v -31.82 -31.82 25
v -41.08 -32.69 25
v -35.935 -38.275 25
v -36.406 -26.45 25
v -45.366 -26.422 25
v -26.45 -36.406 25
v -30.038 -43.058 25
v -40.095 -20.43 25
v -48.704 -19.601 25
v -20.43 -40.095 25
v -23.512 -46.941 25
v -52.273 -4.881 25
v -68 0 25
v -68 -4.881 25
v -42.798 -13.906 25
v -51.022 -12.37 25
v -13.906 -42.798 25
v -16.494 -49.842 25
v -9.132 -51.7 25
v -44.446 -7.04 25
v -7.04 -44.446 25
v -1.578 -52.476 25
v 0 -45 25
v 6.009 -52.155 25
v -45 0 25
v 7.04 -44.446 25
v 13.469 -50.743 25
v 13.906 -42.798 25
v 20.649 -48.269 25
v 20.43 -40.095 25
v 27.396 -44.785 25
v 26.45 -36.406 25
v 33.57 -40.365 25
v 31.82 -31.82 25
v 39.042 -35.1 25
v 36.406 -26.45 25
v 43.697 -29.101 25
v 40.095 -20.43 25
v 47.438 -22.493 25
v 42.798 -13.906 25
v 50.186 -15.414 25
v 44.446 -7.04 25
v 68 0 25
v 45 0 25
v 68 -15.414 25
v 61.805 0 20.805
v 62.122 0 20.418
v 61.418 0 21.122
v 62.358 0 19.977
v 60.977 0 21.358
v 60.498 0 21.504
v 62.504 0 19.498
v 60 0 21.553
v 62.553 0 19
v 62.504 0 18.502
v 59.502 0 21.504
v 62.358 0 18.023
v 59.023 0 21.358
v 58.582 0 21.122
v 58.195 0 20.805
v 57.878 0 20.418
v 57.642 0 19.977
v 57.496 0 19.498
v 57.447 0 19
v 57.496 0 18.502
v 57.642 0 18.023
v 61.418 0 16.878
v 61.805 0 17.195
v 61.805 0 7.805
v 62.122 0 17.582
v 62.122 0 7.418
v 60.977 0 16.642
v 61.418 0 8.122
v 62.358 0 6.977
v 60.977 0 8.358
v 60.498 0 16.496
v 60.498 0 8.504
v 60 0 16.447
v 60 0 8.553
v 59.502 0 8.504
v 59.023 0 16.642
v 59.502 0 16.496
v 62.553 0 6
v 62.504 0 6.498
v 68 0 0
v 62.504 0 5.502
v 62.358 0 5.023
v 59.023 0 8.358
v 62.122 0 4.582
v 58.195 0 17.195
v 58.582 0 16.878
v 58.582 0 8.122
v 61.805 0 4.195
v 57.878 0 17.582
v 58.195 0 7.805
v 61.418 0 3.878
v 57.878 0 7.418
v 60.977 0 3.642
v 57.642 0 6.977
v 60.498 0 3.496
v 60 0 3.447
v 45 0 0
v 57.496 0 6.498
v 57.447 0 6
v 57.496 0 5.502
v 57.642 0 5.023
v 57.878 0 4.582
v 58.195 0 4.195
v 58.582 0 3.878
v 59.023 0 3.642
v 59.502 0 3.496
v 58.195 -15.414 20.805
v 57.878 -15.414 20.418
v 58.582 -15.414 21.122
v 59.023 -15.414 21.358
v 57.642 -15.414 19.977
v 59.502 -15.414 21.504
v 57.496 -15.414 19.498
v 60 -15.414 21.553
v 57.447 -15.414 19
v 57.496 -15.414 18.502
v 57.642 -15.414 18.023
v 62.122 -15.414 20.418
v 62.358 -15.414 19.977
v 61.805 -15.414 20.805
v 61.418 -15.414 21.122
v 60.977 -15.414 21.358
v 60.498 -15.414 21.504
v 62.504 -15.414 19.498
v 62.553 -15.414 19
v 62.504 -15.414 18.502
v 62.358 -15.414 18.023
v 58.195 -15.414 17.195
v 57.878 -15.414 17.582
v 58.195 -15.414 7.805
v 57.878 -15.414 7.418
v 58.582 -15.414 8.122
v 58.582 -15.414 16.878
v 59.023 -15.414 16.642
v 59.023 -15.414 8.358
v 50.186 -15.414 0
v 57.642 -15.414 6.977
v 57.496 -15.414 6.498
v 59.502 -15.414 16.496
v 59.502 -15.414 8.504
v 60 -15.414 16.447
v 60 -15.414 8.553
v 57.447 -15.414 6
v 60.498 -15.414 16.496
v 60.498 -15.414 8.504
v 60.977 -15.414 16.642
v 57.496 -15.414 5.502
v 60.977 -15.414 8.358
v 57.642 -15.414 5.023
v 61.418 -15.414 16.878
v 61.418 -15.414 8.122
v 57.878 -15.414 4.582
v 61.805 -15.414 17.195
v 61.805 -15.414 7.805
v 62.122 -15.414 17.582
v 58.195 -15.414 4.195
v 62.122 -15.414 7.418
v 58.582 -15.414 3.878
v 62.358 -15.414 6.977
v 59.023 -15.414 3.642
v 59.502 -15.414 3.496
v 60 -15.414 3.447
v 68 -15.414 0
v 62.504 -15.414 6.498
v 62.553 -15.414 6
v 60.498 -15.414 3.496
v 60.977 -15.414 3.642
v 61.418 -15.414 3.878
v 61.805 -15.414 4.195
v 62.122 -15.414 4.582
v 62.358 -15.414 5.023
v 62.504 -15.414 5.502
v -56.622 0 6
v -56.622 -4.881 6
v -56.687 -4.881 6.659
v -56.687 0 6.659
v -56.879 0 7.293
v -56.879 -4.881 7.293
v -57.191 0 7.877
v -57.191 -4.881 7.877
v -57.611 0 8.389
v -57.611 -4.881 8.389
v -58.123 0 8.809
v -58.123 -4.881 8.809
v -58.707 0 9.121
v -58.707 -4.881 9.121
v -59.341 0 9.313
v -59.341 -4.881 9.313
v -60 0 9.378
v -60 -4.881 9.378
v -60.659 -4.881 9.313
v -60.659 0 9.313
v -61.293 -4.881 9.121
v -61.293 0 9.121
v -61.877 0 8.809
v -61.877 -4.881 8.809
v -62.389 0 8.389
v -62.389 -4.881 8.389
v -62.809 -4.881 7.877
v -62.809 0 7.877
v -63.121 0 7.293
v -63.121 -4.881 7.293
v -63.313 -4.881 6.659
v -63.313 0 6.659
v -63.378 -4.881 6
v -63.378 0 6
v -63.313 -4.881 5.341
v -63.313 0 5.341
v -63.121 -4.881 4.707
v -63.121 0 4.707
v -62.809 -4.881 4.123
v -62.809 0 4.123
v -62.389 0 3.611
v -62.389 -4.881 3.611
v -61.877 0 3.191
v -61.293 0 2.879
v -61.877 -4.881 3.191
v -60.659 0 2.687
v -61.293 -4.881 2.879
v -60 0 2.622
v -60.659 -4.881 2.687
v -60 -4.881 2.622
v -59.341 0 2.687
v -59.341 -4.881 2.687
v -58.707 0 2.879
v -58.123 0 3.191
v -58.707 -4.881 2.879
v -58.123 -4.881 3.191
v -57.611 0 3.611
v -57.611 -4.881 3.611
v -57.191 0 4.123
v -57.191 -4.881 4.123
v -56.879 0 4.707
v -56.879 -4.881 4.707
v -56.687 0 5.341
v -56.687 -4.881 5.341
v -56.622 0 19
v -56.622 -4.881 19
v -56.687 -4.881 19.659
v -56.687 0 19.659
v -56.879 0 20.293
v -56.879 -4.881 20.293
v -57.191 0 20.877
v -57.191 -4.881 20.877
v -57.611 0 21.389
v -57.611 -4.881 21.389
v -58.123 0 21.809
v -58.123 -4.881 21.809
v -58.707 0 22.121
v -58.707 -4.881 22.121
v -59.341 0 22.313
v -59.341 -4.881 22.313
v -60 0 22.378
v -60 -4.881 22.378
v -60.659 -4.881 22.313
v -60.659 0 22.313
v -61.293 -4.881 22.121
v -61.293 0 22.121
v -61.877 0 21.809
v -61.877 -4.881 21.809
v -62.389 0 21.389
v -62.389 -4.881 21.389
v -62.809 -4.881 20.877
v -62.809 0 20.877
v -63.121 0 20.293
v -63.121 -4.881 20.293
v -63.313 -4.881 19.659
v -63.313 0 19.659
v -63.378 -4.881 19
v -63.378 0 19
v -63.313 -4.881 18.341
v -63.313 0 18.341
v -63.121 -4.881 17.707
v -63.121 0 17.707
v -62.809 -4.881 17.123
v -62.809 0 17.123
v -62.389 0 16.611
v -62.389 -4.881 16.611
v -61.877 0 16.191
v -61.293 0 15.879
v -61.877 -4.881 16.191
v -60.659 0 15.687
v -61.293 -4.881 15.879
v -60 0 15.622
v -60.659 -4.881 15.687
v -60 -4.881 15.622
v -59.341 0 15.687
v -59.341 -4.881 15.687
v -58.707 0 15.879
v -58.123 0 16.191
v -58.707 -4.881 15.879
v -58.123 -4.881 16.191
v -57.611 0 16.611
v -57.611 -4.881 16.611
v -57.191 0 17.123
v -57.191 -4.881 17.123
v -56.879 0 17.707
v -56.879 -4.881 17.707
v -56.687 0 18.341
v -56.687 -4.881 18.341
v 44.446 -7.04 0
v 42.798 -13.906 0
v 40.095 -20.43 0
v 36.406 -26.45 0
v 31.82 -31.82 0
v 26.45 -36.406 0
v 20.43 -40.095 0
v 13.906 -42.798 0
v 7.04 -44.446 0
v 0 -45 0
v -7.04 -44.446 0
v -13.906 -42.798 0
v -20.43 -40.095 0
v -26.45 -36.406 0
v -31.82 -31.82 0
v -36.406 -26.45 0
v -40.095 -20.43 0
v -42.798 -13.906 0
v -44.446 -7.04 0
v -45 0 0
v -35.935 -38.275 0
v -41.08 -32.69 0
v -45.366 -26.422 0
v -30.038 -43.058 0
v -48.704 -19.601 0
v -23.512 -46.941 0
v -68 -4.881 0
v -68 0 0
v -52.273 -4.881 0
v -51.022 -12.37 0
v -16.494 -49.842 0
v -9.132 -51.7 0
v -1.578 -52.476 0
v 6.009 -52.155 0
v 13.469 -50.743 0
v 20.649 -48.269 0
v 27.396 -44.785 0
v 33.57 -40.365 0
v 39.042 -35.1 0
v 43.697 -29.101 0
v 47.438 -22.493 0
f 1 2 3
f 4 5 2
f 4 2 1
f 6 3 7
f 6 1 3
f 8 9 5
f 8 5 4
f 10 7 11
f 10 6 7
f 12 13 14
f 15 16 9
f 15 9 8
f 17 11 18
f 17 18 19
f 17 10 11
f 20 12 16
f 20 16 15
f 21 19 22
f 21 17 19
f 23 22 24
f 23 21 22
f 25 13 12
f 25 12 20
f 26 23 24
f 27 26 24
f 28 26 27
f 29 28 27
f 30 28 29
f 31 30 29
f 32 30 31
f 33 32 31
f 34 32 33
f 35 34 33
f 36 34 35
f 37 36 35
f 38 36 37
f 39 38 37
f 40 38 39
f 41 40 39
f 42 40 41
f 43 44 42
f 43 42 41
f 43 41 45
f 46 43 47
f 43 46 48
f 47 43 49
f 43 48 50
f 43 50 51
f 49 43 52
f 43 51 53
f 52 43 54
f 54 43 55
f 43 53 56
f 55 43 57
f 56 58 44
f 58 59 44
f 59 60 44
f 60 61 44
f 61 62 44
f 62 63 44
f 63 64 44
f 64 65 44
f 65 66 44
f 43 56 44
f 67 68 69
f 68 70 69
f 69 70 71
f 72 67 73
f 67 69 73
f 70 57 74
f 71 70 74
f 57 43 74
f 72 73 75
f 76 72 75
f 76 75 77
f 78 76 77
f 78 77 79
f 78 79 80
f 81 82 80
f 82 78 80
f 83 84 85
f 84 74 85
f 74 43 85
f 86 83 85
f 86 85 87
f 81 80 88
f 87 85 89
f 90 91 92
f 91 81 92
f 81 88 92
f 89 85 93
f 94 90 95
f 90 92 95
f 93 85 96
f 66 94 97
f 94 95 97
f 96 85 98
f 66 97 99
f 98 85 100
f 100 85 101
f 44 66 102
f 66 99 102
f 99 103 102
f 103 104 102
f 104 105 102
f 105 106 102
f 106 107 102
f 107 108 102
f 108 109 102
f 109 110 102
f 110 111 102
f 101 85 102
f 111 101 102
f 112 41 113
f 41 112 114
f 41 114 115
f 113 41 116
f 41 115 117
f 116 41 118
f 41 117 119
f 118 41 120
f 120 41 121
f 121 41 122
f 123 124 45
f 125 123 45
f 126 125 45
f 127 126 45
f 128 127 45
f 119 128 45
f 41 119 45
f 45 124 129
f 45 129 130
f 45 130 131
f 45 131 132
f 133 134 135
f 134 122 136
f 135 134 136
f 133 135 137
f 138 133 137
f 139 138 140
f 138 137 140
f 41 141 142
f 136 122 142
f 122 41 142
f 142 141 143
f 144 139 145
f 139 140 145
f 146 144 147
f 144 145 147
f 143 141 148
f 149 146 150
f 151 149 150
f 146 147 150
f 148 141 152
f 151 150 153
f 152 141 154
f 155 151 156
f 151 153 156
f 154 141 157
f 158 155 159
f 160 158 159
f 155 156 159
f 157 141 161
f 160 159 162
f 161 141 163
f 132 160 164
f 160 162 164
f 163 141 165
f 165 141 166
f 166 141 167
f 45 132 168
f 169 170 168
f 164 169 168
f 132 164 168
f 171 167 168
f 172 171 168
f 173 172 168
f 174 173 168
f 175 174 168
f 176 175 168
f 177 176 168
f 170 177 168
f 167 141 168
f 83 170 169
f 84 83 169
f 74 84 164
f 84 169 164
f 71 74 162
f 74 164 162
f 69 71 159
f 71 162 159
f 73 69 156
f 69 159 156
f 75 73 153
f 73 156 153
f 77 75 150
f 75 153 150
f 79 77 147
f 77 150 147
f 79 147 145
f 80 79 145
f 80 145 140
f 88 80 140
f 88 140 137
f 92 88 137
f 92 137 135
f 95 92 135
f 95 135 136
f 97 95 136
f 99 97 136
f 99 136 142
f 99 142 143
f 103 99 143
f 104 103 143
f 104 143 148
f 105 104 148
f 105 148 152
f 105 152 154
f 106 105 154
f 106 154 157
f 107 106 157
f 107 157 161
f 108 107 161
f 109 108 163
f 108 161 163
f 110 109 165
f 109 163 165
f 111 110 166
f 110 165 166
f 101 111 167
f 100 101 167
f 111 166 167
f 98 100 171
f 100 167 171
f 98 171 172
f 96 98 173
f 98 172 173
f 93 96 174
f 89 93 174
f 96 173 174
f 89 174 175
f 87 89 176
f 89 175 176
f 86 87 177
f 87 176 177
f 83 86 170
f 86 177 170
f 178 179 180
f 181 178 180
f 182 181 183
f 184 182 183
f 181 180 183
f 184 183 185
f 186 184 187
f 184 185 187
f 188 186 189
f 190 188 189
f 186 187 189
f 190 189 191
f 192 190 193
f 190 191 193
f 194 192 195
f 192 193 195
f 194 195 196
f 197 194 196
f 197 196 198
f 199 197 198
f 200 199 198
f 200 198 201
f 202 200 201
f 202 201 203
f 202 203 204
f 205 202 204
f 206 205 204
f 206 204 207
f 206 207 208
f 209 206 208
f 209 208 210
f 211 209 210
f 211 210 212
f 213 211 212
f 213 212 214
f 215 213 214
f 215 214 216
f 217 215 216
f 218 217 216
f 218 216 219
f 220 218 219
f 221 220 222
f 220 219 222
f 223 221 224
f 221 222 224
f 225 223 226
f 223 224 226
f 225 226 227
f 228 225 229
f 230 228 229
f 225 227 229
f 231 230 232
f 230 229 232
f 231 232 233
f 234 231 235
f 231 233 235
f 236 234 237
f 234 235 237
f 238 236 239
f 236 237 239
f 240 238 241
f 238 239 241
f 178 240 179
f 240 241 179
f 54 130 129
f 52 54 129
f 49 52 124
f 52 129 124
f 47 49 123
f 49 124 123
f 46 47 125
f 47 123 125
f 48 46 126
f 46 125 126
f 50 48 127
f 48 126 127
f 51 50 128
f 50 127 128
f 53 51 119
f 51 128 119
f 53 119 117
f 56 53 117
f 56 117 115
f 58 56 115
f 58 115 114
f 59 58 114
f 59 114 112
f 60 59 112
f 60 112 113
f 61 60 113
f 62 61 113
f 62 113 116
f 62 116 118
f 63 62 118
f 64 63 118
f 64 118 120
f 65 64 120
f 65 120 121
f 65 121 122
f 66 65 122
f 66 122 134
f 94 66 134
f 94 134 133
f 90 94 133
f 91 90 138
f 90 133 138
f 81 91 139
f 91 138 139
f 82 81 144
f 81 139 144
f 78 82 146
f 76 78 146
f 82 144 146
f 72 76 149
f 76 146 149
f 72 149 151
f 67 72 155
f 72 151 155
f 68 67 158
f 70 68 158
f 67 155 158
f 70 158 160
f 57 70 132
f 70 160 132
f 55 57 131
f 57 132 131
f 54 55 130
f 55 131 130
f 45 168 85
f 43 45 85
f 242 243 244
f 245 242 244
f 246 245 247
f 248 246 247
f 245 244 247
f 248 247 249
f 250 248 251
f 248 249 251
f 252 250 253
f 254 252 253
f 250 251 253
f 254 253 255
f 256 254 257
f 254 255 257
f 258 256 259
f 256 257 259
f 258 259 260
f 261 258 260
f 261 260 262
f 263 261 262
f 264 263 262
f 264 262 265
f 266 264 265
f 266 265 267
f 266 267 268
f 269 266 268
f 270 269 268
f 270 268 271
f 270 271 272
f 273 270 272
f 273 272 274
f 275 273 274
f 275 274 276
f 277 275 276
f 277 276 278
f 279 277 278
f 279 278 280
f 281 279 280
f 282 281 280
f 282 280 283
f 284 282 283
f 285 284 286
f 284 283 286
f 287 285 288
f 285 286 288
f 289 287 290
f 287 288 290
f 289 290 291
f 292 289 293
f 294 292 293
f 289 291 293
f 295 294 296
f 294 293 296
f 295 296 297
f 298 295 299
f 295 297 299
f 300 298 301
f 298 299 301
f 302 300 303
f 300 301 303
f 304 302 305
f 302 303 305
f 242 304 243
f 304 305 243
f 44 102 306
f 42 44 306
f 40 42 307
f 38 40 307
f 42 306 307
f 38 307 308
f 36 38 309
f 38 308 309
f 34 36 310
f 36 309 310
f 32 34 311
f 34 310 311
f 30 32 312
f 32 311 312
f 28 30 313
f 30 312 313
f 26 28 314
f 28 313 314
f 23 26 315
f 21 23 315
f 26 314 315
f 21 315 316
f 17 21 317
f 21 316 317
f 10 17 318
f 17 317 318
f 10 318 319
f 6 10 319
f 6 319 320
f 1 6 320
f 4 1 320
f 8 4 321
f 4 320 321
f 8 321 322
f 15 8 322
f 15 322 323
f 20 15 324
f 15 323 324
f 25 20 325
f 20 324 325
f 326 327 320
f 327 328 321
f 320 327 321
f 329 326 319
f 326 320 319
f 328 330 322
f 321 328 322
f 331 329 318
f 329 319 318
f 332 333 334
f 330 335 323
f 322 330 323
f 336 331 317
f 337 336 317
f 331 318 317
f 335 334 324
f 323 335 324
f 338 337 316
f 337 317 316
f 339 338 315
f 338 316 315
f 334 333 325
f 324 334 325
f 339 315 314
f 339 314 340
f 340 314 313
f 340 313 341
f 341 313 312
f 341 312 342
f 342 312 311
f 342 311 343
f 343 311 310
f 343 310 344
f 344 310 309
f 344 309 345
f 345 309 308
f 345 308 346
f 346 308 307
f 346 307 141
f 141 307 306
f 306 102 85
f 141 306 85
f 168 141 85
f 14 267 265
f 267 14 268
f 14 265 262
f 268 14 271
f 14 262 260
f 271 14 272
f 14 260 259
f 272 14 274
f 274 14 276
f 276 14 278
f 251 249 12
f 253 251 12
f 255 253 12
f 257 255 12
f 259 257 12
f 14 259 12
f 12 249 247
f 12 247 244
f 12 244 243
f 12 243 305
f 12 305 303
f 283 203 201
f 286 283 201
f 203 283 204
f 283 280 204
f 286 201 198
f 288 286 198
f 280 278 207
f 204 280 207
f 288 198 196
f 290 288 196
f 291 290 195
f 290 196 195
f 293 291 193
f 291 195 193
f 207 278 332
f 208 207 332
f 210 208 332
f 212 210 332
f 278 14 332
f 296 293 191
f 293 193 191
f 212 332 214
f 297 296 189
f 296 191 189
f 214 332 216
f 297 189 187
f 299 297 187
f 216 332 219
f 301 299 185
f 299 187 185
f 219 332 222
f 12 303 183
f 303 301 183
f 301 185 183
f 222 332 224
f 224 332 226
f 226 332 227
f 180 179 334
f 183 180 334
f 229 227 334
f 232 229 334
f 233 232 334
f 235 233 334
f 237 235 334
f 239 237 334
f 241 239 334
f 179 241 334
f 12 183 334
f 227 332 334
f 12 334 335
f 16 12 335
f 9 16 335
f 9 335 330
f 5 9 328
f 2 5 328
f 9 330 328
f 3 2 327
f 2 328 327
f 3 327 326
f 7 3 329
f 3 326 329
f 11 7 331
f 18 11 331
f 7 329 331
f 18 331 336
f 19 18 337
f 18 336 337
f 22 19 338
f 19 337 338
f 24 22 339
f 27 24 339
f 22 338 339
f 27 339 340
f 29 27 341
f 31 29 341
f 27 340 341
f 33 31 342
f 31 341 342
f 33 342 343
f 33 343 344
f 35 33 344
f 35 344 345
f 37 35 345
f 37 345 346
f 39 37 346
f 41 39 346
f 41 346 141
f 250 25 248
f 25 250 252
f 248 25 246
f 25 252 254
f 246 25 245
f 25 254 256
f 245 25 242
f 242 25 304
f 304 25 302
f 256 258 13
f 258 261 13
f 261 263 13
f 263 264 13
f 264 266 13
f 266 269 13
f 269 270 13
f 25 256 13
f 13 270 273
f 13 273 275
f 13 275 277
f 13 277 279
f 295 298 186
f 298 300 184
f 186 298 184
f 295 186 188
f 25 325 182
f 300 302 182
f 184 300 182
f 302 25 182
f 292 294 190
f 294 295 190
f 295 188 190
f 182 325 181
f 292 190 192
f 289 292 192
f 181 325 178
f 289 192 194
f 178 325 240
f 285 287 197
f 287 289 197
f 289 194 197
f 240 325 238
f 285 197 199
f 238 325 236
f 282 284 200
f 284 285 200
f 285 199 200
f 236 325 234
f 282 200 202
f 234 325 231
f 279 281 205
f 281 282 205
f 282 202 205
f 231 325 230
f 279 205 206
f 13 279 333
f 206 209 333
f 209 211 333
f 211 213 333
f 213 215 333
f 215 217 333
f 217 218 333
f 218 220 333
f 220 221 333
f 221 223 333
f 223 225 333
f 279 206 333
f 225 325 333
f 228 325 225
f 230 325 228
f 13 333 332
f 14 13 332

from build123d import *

# Parameters (mm, degrees)
F1_DEPTH = 25
F4_D     = 5.1054
F4_DEPTH = 25
F4_TIP   = 1.5338169022
F5_D     = 6.7564
F5_DEPTH = 25
F5_TIP   = 2.0298273432


with BuildPart() as f1:
    # F0 (on Top) → F1 (new body)
    with BuildSketch(Plane.XY):
        with BuildLine():
            ThreePointArc((45, 0), (0, -45), (-45, 0))
            Line((-45, 0), (-68, 0))
            Line((-68, 0), (-68, -4.880737979))
            Line((-68, -4.880737979), (-52.2726352577, -4.880737979))
            ThreePointArc((-52.2726352577, -4.880737979), (-5.3689869527, -52.2247448926), (50.1862195886, -15.4140638188))
            Line((50.1862195886, -15.4140638188), (68, -15.4140638188))
            Line((68, -15.4140638188), (68, 0))
            Line((68, 0), (45, 0))
        make_face()
    extrude(amount=F1_DEPTH)

    # F4
    with Locations(Plane(origin=(0, 0, 0), x_dir=(-1, 0, 0), z_dir=(0, 1, 0))):
        with Locations((-60, 6), (-60, 19)):
            Hole(F4_D / 2, depth=F4_DEPTH)
            with Locations((0, 0, -(F4_DEPTH + F4_TIP / 2))):  # 118° drill point
                Cone(0, F4_D / 2, F4_TIP, mode=Mode.SUBTRACT)

    # F5
    with Locations(Plane(origin=(0, 0, 0), x_dir=(-1, 0, 0), z_dir=(0, 1, 0))):
        with Locations((60, 6), (60, 19)):
            Hole(F5_D / 2, depth=F5_DEPTH)
            with Locations((0, 0, -(F5_DEPTH + F5_TIP / 2))):  # 118° drill point
                Cone(0, F5_D / 2, F5_TIP, mode=Mode.SUBTRACT)


solid = f1.part
